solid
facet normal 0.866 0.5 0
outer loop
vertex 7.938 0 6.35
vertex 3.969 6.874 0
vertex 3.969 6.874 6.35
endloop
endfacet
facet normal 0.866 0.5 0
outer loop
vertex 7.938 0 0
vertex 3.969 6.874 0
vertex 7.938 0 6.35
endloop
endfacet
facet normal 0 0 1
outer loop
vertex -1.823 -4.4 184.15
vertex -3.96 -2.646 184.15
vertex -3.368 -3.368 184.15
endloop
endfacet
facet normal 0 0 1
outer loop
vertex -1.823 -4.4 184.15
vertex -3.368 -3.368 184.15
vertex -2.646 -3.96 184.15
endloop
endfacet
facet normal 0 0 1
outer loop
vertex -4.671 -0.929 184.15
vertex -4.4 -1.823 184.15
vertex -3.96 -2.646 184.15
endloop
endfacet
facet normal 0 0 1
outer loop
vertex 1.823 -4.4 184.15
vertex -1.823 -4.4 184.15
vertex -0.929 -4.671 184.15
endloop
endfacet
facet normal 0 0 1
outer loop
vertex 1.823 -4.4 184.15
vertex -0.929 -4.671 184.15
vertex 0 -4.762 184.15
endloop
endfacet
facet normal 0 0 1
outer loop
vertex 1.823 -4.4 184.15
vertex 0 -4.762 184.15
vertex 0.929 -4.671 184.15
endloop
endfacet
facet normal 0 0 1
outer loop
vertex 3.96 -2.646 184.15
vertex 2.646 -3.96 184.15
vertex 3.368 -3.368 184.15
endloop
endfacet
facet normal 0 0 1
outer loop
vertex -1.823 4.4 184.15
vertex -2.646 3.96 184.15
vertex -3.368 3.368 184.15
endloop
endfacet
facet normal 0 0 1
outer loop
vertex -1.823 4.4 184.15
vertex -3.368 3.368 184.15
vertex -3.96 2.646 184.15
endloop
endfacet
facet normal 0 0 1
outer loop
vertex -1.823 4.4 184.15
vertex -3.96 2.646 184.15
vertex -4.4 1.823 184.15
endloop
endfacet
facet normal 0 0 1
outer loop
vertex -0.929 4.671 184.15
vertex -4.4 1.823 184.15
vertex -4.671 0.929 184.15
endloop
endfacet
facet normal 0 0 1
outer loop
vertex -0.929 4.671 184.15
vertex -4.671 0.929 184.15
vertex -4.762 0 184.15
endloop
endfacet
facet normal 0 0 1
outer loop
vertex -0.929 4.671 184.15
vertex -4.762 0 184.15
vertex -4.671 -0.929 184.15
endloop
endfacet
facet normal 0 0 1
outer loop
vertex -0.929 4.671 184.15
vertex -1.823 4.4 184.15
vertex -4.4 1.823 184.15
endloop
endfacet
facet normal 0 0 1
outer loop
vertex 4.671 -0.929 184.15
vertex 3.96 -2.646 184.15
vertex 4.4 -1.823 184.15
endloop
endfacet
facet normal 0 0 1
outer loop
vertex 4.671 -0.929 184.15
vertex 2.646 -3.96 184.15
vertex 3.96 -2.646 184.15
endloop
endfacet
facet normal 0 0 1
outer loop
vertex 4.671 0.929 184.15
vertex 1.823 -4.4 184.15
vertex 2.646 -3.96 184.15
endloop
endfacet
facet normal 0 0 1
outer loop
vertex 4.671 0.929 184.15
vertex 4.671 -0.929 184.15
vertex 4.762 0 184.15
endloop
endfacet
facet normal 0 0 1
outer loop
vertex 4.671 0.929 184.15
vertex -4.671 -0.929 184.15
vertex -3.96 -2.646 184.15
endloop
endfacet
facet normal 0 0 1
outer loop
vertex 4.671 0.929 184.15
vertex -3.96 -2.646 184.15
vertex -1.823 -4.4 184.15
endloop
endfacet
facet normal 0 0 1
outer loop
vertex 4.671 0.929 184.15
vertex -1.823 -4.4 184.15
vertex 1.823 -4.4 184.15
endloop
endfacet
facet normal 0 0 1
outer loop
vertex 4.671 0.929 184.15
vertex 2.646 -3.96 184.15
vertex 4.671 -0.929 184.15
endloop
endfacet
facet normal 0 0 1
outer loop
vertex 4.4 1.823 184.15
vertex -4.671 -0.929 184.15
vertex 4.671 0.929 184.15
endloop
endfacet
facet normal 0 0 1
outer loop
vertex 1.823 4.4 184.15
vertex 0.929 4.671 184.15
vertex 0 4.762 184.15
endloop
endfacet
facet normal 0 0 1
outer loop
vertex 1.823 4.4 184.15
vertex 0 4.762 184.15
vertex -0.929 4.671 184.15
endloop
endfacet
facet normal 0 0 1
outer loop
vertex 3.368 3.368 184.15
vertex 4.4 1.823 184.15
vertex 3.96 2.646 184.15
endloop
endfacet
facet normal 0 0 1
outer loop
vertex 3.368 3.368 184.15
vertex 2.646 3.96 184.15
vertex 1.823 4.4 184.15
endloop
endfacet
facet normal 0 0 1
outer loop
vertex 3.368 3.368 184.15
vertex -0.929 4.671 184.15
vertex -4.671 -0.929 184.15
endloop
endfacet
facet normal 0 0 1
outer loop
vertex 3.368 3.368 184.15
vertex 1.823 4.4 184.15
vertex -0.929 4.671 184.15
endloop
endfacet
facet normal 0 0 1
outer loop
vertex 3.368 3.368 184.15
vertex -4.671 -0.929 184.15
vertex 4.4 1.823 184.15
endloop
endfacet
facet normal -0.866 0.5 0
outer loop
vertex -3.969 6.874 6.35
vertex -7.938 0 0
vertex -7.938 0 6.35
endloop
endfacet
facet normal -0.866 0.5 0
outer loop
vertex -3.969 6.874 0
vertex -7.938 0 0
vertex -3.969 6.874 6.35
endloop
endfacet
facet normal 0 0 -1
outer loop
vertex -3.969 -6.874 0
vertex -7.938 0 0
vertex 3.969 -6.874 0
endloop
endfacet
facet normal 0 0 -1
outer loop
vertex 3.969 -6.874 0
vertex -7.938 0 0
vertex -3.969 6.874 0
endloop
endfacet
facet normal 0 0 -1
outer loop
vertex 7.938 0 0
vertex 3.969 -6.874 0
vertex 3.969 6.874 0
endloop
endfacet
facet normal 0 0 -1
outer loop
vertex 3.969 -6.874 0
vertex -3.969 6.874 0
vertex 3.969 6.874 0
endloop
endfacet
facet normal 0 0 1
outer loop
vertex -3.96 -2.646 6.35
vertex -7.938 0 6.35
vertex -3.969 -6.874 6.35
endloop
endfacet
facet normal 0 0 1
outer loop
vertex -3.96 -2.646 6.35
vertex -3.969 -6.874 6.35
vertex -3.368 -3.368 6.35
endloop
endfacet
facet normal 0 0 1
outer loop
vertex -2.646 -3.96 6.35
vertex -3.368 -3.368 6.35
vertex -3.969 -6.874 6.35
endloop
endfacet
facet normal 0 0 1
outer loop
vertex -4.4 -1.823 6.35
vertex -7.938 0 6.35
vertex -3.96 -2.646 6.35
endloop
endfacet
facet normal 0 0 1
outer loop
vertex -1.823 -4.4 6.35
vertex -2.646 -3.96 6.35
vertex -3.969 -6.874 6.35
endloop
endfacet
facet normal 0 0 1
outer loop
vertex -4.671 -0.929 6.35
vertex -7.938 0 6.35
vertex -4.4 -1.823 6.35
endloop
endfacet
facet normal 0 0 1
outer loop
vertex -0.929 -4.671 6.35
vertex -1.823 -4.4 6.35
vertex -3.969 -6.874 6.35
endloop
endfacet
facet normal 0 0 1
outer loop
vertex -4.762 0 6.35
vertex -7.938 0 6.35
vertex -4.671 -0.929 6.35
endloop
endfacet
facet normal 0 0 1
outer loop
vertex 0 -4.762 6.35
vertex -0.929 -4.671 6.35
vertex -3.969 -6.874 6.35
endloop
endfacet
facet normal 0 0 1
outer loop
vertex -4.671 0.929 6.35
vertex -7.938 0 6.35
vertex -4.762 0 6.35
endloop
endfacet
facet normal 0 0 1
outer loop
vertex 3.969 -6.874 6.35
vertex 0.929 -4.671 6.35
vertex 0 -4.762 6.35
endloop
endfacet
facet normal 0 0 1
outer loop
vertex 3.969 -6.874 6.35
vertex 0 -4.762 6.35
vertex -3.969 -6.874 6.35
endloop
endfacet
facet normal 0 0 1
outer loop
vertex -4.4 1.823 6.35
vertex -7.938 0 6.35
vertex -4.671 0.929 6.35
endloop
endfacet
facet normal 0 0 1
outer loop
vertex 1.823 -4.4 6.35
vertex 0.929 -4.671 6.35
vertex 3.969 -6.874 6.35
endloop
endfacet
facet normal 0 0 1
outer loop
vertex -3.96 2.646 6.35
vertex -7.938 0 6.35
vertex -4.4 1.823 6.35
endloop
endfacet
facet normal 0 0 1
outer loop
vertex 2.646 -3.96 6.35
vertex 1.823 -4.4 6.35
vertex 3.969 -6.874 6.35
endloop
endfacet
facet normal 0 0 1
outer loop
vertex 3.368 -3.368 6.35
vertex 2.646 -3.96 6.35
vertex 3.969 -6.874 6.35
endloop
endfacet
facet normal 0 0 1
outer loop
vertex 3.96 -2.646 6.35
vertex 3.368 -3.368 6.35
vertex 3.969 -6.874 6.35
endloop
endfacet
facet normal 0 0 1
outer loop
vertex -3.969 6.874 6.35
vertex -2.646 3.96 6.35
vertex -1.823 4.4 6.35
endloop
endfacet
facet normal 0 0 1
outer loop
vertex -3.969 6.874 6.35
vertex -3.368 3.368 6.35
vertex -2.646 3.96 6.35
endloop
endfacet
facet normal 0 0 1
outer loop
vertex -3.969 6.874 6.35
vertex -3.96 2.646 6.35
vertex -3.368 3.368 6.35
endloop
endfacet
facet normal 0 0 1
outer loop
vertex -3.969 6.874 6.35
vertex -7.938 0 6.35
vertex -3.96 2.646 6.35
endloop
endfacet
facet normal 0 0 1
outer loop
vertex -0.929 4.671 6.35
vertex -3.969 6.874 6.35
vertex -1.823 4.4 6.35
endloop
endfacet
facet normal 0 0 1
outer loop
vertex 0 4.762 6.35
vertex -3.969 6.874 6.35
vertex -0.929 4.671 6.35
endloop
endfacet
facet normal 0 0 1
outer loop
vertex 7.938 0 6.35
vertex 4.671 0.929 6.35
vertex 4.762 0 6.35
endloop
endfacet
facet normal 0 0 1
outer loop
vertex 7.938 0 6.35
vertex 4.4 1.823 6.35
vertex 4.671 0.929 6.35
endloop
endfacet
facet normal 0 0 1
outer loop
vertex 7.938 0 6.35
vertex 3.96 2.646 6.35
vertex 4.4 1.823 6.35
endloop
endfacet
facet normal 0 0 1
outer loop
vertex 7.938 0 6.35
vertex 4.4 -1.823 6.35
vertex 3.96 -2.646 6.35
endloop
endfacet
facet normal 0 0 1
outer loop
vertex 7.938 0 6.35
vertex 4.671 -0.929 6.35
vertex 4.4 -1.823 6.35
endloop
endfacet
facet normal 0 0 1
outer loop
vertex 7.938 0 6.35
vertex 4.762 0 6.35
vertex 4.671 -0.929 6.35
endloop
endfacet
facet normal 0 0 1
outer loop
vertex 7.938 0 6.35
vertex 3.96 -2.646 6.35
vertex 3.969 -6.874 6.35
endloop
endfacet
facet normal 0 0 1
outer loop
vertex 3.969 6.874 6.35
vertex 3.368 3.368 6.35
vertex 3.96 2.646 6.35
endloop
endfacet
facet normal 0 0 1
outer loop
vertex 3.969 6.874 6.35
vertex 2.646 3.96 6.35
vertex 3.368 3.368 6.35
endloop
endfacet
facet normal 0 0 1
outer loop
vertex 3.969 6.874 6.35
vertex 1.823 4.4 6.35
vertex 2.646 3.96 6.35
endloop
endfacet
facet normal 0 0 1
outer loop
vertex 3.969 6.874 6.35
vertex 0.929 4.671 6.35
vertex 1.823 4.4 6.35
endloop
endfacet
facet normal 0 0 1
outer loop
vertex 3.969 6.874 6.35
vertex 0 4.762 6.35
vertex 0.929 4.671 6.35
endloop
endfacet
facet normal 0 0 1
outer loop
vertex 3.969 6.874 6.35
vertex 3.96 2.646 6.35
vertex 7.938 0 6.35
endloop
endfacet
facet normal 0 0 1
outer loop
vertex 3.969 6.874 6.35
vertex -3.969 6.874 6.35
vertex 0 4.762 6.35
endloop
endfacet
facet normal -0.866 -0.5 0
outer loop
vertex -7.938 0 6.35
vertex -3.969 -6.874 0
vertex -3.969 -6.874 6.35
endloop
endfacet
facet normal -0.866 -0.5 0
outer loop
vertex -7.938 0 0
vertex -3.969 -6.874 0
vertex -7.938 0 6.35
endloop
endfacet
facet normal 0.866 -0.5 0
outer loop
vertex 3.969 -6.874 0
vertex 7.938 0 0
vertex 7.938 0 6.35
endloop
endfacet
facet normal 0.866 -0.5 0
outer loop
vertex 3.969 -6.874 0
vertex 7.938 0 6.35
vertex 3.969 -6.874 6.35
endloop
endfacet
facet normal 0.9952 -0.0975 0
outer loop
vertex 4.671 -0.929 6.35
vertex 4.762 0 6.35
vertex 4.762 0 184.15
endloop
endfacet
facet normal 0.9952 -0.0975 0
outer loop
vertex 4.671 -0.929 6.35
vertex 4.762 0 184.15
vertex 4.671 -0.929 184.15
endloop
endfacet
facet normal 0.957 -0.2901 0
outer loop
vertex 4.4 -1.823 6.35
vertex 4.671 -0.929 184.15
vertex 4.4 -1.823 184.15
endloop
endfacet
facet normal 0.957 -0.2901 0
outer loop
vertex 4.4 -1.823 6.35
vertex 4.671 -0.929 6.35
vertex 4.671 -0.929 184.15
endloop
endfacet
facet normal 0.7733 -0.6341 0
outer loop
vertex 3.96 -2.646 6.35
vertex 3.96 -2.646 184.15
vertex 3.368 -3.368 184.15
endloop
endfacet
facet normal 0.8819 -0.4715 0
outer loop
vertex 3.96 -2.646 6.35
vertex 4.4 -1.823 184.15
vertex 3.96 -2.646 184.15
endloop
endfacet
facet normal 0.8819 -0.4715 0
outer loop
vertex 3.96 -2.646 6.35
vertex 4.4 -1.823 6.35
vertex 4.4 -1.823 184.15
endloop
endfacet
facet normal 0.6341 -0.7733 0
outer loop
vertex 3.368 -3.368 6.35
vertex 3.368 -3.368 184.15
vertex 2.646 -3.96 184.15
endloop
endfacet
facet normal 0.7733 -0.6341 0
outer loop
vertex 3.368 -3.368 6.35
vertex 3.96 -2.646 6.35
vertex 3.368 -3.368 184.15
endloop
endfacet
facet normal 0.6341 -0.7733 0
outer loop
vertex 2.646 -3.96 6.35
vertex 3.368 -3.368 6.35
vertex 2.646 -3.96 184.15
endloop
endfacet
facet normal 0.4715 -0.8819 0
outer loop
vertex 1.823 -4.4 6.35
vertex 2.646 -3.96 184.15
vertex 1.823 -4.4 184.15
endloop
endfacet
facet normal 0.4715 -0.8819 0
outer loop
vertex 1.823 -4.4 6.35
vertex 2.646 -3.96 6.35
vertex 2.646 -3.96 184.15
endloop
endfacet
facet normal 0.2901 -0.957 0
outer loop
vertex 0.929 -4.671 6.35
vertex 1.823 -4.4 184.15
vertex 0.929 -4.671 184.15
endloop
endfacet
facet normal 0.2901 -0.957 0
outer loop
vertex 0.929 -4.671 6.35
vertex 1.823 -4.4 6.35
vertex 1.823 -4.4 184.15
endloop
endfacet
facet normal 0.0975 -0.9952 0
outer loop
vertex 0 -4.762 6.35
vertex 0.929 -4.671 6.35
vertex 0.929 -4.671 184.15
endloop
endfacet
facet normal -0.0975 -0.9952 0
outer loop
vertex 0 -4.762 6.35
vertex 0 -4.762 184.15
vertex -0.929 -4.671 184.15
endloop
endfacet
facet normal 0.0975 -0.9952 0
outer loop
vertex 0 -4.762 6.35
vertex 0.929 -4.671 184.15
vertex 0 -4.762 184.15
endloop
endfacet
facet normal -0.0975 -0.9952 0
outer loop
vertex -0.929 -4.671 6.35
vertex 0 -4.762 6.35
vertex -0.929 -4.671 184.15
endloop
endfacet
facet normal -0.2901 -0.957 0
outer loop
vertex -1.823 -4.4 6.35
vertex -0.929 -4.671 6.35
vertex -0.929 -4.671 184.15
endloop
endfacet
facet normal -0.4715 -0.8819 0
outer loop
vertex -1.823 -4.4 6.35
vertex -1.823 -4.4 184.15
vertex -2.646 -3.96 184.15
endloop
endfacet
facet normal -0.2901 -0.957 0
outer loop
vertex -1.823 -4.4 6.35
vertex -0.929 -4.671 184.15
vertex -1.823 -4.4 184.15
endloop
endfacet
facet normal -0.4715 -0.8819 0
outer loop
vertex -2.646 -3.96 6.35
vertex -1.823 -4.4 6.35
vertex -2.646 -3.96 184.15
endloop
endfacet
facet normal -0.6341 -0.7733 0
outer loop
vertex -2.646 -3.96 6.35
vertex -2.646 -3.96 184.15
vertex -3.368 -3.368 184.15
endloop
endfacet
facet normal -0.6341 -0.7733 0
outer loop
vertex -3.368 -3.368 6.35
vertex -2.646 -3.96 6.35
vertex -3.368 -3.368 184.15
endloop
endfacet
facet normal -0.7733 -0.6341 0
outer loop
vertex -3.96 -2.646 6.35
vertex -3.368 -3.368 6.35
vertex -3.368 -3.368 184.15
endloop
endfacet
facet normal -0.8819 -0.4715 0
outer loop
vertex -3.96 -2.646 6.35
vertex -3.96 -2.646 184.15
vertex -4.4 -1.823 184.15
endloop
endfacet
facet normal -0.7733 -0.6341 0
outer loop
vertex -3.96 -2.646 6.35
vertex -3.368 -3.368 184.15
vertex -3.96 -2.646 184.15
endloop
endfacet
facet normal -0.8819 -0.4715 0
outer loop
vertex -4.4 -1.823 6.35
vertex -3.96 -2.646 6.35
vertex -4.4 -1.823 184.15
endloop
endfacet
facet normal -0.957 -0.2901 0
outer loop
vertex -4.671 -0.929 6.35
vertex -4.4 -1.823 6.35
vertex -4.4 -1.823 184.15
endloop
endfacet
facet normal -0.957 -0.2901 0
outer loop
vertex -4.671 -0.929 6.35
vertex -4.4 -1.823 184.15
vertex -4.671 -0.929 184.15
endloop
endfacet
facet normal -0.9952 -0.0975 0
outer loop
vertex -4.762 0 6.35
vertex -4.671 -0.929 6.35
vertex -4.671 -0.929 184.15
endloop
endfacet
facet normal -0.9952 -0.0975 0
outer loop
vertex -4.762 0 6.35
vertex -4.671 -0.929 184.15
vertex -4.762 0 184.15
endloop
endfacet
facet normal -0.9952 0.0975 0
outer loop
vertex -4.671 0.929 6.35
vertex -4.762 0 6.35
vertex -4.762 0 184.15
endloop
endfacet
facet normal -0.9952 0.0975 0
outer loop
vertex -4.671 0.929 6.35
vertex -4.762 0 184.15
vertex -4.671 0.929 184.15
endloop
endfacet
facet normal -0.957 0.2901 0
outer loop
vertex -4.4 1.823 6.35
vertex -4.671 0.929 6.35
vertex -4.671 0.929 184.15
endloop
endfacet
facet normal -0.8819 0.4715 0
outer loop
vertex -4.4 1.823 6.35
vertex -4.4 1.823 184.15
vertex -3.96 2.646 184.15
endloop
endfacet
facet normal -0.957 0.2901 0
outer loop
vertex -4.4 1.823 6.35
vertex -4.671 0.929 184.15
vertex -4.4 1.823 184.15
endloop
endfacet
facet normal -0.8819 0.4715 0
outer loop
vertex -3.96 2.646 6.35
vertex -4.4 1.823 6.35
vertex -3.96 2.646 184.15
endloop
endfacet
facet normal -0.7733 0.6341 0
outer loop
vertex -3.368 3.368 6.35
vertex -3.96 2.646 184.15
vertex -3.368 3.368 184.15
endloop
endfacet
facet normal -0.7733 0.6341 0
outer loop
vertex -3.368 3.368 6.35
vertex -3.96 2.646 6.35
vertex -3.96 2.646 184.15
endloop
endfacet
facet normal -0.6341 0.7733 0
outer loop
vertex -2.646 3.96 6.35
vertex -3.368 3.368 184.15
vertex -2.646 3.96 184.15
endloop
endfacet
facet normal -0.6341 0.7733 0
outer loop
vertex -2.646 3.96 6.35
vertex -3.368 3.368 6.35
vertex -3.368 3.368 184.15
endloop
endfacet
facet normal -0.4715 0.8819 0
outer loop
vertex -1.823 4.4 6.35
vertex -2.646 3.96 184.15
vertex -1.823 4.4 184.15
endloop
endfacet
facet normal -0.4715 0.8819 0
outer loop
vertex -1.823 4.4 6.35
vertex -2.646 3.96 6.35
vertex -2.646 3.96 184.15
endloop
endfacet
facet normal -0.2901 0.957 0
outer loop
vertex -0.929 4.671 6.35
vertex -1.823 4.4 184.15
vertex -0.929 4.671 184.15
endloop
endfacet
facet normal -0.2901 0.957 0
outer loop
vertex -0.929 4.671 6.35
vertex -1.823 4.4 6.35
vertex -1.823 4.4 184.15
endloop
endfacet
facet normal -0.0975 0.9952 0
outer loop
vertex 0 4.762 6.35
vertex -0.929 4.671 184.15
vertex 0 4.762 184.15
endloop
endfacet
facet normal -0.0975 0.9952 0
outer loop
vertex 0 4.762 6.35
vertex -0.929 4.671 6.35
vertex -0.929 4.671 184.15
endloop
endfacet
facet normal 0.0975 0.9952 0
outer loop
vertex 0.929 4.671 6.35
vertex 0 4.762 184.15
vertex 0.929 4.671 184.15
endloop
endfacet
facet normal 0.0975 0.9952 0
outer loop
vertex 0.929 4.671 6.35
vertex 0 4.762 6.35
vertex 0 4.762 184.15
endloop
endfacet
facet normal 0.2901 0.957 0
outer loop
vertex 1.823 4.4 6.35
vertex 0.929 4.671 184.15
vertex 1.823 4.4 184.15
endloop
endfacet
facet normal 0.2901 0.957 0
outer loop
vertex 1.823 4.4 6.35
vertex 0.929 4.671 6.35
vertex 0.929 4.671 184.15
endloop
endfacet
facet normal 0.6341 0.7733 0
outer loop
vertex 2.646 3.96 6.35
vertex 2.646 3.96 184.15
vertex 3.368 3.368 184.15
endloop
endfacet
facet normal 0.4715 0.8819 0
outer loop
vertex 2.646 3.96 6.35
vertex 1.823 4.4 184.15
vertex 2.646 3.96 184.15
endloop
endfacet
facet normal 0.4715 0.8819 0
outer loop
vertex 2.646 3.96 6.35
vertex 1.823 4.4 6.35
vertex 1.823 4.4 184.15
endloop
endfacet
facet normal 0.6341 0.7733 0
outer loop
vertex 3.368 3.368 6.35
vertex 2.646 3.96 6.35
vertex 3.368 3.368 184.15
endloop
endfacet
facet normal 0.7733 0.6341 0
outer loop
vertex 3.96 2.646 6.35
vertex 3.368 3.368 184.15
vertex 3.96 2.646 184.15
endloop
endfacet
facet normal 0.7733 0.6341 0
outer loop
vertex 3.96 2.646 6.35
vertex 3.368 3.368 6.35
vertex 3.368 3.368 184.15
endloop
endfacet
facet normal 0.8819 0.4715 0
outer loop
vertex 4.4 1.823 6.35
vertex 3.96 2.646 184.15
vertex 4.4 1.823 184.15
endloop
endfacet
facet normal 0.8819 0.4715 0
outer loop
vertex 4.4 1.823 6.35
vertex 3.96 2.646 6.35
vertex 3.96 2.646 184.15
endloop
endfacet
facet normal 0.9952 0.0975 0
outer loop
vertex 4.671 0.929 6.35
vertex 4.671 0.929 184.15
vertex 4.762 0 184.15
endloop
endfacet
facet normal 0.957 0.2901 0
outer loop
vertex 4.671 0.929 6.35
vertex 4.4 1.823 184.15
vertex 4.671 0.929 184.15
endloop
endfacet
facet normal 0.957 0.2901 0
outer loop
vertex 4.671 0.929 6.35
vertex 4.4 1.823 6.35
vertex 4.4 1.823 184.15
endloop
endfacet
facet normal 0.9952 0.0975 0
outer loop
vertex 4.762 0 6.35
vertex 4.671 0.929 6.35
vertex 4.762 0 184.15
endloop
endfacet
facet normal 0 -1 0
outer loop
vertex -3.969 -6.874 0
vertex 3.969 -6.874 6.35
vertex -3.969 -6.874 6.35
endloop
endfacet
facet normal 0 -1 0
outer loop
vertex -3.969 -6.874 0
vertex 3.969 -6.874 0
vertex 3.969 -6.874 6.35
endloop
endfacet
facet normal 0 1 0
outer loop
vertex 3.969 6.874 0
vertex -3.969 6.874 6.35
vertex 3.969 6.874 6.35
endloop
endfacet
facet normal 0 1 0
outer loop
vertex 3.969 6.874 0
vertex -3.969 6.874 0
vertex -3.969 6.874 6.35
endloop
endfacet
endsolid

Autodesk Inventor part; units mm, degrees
ref_plane "YZ Plane" through (0, 0, 0) normal (1, 0, 0) x (0, 1, 0)
ref_plane "XZ Plane" through (0, 0, 0) normal (0, 1, 0) x (-1, 0, 0)
ref_plane "XY Plane" through (0, 0, 0) normal (0, 0, 1) x (1, 0, 0)
sketch "Sketch1" plane through (0, 0, 0) normal (0, 0, 1) x (1, 0, 0)
  line L0 (-3.9687, 6.8741) -> (3.9687, 6.8741)
  line L1 (3.9687, 6.8741) -> (7.9375, 0)
  line L2 (7.9375, 0) -> (3.9687, -6.8741)
  line L3 (3.9687, -6.8741) -> (-3.9688, -6.8741)
  line L4 (-3.9688, -6.8741) -> (-7.9375, 0)
  line L5 (-7.9375, 0) -> (-3.9687, 6.8741)
  point P0 (0, 0)
  point P1 (0, 6.8741)
  dimension "d0" = 15.875
extrude "Extrusion1" add sketch "Sketch1" along normal blind 6.35
sketch "Sketch2" plane through (0, 0, 6.35) normal (0, 0, 1) x (1, 0, 0)
  circle A0 centre (0, 0) radius 4.7625
  dimension "d3" = 9.525
extrude "Extrusion2" add sketch "Sketch2" along normal blind 177.8
thread "Thread1" size "3/8-16 UNC" class "2A" standard "ANSI Unified Screw Threads" length 33.655
properties part number "7in bolt"
